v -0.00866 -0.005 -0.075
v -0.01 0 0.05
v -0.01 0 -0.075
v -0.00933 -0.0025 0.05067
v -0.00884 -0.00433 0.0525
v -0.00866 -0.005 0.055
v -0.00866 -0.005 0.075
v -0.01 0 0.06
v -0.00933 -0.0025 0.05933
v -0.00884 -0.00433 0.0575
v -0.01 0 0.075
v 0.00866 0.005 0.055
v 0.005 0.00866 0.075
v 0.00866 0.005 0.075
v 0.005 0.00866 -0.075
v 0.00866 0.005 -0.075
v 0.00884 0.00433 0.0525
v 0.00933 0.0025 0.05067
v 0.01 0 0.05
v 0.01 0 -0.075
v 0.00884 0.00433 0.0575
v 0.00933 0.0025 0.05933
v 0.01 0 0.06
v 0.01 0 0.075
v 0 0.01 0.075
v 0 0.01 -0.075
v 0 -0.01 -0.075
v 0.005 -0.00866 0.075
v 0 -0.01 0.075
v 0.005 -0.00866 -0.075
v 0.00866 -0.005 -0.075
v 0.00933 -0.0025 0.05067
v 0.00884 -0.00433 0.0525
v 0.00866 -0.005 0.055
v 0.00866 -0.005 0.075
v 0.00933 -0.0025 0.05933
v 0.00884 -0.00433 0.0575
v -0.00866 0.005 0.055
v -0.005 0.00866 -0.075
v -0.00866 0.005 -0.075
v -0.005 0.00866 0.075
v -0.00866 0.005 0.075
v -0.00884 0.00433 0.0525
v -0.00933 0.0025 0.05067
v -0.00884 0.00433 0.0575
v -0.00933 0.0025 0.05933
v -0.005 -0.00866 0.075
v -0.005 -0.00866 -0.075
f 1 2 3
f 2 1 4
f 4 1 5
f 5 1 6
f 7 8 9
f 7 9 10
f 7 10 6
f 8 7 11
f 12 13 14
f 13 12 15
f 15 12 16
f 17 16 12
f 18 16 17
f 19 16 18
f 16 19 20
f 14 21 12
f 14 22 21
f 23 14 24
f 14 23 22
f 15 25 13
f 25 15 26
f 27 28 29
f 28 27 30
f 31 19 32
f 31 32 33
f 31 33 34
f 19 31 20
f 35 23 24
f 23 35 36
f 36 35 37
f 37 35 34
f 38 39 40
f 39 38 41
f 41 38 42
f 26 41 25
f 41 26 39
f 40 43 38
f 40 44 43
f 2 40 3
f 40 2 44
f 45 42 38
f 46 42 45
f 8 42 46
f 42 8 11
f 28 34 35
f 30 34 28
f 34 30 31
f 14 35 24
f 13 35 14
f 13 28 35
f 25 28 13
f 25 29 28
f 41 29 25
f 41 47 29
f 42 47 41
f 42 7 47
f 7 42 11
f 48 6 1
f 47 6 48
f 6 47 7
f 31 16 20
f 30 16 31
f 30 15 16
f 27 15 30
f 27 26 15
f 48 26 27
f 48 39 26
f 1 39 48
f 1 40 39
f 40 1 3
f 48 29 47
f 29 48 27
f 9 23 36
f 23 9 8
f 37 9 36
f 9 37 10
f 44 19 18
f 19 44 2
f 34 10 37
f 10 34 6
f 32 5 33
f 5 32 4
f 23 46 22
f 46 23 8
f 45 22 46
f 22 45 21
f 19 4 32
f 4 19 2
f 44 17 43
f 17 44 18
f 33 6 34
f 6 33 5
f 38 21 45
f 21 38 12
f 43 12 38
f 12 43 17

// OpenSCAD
// Long faceted rod with a single transverse through-hole near one end
// Units: mm

rod_L = 0.15;                    // overall length
rod_D = 0.02;                    // diameter
hole_D = 0.010;                  // cross-hole diameter (visible)
hole_offset_from_end = 0.02;     // distance from one end face to hole center
facet_fn = 12;                   // low-poly facets
eps = 0.002;                     // small robust boolean overlap (mm)

// Derived
rod_r  = rod_D/2;
hole_r = hole_D/2;

// Place hole near the "top" end so it reads clearly in side views
// Rod is centered at Z=0, so top end face is at +rod_L/2
hole_z_raw = rod_L/2 - hole_offset_from_end;

// Keep hole fully inside the rod length (avoid clipping at end faces)
hole_z = min(max(hole_z_raw, -rod_L/2 + hole_r + eps), rod_L/2 - hole_r - eps);

difference() {
    // Featureless faceted rod (upright along Z)
    cylinder(h=rod_L, r=rod_r, center=true, $fn=facet_fn);

    // Single transverse through-hole (along X), extended past OD for a clean cut
    translate([0, 0, hole_z])
        rotate([0, 90, 0])
            cylinder(h=rod_D + 2*eps, r=hole_r, center=true, $fn=facet_fn);
}
